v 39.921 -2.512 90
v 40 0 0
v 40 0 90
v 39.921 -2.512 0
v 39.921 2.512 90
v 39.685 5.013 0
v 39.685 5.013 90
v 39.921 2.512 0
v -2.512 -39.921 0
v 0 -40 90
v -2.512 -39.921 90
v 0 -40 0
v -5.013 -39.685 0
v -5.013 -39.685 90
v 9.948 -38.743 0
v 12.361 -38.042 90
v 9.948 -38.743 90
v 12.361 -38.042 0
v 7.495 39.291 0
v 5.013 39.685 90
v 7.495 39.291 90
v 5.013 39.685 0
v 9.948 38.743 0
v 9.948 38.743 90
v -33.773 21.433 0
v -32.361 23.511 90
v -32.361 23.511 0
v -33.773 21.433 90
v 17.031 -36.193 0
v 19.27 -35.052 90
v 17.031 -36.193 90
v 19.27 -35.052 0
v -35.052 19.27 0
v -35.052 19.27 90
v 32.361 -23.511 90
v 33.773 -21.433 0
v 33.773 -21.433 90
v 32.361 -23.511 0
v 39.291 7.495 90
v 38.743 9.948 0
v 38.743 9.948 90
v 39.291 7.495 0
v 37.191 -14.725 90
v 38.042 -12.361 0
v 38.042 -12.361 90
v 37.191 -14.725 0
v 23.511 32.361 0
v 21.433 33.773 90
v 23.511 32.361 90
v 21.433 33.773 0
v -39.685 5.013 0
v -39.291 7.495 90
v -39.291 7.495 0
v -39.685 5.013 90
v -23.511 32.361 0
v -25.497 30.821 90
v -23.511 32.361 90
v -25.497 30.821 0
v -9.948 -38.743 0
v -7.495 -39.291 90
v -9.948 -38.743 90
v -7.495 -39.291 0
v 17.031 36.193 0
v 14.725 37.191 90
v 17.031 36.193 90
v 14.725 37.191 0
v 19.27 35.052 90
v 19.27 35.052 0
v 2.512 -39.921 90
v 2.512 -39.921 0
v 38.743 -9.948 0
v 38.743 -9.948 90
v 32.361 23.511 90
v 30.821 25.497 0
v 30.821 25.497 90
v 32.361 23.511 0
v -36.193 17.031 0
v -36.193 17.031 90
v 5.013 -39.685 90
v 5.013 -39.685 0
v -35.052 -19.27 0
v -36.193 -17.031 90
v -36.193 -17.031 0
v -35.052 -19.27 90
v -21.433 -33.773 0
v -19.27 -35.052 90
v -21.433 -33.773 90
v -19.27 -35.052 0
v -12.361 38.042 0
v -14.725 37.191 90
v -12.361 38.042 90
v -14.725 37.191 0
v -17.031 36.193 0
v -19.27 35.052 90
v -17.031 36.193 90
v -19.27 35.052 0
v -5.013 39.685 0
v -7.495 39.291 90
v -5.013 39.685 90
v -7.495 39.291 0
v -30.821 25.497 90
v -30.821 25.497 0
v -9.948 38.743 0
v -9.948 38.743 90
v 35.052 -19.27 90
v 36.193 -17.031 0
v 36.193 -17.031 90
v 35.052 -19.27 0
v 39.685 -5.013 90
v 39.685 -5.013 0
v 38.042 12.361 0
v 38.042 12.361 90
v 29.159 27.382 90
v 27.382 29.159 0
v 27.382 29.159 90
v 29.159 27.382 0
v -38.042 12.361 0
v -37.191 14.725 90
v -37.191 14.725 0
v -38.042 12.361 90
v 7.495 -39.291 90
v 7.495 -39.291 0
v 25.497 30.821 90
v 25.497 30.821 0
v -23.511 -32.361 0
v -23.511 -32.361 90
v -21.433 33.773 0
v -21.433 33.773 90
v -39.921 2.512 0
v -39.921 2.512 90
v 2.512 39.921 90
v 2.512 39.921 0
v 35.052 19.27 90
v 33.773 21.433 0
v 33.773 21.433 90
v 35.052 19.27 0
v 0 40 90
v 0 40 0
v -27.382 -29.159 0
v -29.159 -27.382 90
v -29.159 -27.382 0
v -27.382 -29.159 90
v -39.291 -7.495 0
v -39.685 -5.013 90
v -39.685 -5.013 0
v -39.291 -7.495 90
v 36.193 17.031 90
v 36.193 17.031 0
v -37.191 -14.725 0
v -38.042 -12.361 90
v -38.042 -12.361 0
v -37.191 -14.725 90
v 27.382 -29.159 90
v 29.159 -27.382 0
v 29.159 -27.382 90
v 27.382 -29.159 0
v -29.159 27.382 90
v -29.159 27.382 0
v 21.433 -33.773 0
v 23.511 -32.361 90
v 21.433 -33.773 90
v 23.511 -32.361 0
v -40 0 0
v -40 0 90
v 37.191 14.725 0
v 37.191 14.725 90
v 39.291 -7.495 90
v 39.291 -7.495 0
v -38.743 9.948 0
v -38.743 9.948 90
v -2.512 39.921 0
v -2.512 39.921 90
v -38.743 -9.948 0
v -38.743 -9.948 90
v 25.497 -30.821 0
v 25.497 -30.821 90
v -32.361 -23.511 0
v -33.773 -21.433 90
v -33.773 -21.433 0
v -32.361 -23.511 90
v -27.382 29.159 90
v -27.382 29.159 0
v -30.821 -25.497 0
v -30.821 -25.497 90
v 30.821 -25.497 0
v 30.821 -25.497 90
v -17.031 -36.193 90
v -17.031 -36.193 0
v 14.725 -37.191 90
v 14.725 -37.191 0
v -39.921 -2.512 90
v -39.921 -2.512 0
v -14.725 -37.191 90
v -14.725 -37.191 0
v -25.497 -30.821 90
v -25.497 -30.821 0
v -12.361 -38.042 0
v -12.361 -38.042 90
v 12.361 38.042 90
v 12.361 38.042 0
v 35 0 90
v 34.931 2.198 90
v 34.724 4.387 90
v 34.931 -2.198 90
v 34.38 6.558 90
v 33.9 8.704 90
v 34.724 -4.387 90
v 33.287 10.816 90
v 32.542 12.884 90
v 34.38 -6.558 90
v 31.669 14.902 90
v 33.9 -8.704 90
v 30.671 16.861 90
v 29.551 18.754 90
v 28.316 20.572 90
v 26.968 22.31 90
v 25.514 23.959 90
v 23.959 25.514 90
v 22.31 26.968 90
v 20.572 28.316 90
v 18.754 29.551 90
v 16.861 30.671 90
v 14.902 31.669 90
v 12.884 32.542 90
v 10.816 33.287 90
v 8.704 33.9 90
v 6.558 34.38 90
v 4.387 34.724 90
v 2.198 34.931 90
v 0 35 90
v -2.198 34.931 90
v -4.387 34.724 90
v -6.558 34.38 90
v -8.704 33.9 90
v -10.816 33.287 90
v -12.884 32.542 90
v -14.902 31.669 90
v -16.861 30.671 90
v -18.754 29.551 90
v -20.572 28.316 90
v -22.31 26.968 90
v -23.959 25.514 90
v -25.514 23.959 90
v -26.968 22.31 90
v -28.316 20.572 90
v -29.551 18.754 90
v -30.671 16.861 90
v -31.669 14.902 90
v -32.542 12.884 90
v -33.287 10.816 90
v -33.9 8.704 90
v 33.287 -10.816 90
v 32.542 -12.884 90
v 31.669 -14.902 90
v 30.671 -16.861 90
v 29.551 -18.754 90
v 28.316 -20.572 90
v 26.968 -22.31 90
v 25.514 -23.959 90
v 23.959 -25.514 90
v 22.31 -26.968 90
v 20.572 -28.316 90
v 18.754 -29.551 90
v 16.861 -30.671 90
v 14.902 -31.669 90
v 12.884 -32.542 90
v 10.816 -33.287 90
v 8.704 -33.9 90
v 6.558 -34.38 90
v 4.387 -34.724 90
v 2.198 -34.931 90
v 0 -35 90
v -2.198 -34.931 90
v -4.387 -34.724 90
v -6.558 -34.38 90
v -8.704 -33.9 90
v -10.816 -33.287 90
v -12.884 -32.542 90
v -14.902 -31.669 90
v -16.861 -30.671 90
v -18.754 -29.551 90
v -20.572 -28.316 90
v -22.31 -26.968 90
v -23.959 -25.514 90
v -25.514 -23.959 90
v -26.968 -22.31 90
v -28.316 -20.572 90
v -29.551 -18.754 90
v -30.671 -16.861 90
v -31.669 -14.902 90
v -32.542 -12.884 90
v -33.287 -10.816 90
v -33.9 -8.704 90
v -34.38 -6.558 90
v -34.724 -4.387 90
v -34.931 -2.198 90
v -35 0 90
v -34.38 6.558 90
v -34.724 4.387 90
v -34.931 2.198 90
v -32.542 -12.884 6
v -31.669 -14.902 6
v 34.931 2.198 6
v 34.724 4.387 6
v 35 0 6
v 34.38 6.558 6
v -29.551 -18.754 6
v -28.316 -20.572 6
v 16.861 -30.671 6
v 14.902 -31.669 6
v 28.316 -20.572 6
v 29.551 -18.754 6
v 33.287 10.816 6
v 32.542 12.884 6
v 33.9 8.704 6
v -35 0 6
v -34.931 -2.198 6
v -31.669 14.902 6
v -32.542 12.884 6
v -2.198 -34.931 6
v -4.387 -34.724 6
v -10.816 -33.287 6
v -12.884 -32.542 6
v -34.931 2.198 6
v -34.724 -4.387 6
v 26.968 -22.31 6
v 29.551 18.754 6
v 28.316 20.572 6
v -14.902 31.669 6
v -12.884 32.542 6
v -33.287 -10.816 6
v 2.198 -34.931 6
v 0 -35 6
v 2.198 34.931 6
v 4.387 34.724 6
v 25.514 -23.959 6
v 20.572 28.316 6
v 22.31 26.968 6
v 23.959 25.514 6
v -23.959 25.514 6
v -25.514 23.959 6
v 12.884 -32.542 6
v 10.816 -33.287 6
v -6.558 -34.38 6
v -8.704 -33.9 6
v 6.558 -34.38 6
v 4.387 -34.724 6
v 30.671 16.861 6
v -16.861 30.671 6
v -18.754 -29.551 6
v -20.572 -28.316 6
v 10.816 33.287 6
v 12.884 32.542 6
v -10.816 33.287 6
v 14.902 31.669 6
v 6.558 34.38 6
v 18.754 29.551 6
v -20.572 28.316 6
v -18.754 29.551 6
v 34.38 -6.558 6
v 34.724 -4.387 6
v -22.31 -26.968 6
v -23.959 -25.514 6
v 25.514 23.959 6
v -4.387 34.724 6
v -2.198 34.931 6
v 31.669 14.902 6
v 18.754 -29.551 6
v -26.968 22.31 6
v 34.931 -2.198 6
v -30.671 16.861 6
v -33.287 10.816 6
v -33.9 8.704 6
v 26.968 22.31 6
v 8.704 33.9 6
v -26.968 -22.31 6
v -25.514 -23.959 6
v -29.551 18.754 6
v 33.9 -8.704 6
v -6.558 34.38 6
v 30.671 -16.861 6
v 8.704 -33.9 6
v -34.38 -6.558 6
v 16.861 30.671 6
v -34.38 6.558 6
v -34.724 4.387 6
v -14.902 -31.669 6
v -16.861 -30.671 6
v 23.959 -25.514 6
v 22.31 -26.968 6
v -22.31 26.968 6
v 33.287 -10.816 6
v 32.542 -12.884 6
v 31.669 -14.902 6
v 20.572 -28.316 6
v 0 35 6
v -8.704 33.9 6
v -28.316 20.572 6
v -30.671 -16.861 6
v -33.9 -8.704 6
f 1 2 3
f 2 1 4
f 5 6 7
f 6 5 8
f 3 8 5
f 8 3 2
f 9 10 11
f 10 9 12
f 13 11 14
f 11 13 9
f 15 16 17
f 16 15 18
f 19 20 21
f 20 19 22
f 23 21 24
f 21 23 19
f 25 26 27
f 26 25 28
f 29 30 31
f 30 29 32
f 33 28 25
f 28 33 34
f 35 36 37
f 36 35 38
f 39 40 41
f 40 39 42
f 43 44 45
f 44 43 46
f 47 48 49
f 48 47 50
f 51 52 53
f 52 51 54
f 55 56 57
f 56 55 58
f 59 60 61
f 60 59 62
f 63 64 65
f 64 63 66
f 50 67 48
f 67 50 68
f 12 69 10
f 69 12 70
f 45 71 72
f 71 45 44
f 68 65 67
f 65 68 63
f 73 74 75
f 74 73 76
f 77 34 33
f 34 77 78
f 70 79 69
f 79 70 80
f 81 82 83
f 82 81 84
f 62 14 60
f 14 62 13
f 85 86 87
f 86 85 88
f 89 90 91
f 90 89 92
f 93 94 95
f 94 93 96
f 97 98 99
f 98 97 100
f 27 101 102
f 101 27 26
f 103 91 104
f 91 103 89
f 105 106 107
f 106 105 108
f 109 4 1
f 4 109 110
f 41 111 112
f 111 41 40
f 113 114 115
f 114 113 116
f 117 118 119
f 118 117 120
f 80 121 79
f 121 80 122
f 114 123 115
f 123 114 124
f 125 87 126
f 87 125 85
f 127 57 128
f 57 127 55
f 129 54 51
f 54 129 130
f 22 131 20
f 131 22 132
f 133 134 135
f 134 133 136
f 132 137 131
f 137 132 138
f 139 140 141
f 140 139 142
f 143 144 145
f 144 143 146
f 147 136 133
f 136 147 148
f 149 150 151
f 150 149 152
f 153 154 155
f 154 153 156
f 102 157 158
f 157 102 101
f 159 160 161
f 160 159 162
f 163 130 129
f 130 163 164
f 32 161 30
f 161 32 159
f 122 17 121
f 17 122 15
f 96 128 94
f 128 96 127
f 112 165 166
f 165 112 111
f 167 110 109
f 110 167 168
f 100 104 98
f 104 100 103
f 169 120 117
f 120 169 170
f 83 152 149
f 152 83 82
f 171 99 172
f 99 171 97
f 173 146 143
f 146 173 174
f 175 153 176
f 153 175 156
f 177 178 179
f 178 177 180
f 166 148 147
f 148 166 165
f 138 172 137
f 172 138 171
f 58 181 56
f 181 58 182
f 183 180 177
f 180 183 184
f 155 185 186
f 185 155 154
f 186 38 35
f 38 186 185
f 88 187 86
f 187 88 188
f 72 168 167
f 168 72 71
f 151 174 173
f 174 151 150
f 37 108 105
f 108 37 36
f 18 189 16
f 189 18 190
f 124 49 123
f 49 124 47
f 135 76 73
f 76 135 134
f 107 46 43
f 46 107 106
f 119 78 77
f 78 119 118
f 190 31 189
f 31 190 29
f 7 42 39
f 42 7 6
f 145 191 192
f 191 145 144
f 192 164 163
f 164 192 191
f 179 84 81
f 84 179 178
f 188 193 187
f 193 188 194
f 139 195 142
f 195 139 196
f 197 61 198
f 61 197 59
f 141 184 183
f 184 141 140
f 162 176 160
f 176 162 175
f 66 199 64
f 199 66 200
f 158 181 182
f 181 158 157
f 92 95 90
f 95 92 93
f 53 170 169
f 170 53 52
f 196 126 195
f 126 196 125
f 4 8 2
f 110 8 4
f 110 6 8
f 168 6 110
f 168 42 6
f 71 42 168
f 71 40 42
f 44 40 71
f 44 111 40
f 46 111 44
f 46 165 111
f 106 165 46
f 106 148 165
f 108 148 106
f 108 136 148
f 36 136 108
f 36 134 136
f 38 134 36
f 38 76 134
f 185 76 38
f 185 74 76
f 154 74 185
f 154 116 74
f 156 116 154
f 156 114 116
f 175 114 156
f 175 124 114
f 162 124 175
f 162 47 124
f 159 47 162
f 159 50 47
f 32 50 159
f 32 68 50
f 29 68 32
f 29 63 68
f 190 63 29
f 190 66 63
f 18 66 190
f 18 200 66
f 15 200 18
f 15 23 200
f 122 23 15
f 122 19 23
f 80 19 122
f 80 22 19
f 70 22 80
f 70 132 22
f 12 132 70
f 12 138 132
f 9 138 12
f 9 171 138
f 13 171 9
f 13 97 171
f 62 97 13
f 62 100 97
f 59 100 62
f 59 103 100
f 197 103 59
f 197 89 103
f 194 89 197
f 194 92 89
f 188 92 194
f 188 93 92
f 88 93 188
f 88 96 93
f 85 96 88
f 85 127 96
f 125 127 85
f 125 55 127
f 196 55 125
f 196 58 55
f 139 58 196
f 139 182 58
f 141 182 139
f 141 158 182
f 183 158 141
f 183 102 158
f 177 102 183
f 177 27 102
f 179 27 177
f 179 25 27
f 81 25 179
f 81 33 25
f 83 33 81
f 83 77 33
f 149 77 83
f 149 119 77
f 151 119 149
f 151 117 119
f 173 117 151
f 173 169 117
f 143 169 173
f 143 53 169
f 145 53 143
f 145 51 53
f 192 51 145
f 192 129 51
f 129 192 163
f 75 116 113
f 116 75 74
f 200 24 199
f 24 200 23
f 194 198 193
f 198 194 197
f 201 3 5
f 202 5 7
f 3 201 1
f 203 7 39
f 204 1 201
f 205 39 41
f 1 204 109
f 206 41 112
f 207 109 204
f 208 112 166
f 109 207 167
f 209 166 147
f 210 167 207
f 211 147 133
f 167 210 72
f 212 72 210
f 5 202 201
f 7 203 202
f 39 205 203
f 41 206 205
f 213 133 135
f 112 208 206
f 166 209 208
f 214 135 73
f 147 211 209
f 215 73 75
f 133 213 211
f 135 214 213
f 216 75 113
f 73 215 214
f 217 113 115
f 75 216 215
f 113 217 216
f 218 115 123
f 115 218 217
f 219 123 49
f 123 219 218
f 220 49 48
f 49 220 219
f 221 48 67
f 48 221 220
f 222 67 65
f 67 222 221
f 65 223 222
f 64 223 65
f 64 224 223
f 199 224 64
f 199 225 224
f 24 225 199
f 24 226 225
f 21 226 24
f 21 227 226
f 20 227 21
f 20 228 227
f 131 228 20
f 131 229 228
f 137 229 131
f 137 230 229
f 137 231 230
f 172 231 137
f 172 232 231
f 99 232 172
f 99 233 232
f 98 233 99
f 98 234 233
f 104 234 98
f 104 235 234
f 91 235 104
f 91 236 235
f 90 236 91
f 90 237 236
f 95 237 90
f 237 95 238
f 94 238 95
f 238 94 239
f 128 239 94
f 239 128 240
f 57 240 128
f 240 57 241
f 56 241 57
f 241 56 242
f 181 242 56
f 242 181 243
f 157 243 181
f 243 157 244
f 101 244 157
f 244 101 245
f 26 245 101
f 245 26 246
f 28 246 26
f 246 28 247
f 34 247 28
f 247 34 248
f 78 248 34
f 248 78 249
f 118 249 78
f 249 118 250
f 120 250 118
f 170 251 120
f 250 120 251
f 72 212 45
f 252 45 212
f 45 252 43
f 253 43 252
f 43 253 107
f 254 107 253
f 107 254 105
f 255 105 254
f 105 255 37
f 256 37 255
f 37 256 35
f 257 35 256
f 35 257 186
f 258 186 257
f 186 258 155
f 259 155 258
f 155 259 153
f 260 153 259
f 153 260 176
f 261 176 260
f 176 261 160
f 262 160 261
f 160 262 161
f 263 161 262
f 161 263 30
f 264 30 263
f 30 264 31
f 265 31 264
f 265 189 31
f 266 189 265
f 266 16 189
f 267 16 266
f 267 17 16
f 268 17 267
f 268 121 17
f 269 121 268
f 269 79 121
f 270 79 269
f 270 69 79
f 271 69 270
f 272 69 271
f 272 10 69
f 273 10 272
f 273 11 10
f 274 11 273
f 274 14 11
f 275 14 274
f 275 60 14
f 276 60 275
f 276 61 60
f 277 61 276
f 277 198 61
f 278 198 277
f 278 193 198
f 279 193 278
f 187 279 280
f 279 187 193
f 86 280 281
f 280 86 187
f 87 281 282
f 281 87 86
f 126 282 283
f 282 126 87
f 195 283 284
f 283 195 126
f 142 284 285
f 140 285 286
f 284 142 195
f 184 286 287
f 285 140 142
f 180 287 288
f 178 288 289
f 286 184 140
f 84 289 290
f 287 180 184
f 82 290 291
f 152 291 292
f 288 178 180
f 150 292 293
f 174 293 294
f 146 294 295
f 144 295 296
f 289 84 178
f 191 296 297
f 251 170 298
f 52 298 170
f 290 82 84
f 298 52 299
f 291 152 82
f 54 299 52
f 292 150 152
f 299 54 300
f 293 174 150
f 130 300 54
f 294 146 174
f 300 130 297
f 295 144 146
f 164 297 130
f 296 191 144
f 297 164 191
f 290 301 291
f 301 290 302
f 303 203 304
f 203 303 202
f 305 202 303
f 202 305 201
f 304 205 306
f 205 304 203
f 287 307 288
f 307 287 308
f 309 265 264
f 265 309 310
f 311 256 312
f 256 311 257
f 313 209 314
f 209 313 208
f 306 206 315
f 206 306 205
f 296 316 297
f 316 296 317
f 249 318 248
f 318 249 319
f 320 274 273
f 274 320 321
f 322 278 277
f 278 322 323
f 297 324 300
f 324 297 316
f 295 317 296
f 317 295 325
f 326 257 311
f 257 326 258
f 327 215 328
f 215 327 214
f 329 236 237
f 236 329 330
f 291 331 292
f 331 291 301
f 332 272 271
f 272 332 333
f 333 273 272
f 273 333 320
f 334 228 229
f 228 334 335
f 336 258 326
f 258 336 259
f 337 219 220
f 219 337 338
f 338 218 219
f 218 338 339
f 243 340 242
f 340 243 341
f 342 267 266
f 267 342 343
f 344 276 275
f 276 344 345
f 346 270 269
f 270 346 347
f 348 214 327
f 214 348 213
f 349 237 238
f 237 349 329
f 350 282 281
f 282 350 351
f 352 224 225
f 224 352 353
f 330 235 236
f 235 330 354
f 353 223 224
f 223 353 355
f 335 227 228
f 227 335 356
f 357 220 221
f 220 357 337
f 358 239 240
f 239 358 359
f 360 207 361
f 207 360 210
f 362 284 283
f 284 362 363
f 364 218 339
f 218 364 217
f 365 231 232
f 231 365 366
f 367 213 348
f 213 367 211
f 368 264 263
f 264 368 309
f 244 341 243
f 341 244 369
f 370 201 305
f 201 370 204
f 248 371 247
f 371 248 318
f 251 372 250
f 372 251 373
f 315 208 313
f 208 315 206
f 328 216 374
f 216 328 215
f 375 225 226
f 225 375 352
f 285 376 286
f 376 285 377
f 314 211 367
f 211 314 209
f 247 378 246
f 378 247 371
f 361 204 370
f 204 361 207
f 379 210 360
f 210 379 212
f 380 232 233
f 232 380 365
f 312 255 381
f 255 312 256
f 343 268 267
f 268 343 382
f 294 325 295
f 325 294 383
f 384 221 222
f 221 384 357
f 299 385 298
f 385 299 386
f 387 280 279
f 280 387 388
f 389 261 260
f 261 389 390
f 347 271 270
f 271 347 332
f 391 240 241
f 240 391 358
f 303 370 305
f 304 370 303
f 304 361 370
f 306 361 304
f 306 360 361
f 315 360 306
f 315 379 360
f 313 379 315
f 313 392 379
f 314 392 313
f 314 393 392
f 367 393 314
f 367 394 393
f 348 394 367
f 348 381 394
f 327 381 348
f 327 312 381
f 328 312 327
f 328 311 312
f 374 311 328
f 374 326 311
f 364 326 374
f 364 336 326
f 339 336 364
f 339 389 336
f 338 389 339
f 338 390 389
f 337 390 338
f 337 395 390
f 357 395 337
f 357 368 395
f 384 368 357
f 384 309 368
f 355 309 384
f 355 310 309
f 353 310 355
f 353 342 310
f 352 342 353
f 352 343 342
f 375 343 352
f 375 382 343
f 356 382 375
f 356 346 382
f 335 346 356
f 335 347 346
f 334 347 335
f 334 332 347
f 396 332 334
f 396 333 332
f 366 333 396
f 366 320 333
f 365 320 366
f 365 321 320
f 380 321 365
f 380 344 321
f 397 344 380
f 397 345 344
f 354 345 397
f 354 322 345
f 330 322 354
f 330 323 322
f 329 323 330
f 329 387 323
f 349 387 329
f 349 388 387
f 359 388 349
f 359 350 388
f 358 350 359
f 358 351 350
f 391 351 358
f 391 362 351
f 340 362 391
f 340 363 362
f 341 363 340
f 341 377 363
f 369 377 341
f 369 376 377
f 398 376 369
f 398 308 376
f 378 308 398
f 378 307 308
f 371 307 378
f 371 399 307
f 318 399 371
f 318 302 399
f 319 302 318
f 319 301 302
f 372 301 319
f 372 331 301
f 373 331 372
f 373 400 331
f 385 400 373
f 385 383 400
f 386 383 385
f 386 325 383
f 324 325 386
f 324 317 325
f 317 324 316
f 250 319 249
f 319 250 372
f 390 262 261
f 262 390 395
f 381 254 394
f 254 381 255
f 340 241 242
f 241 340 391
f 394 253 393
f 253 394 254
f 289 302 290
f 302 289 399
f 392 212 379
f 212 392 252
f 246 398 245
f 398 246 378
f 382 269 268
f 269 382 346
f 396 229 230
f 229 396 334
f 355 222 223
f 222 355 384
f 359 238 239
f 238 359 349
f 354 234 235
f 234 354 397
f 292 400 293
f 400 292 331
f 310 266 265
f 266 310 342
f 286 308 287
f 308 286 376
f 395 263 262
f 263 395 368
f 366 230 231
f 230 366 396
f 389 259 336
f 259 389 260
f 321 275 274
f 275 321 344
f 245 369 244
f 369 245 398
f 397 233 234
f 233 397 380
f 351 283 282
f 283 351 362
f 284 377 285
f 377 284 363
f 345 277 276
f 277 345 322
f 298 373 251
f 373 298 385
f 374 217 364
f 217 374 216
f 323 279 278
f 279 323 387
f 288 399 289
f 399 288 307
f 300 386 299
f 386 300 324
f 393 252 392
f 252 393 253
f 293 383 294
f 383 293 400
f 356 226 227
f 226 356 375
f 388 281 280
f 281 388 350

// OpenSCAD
// マグカップ

$fn = 100;

// 本体パラメータ
outer_d = 80;
inner_d = 70;
height = 90;
bottom_thickness = 6;

// 取手パラメータ
handle_inner_h = 30;   // 取手内側の高さ(Z方向)
handle_inner_w = 25;   // 取手内側の幅(本体からの突き出し方向 = X)
handle_thickness = 8;  // 取手の太さ(径方向の太さ)
handle_depth = 12;     // 取手の Y 方向の厚み(指がかかる面の幅)

module mug_body() {
    difference() {
        cylinder(d = outer_d, h = height);
        translate([0, 0, bottom_thickness])
            cylinder(d = inner_d, h = height - bottom_thickness + 0.01);
    }
}

module handle() {
    // XZ 平面で D 字の外形と内側の穴を作り、Y 方向に linear_extrude で厚み(handle_depth)を付ける
    
    handle_outer_h = handle_inner_h + 2 * handle_thickness; // Z 方向の総高さ
    handle_outer_w = handle_inner_w + handle_thickness;     // X 方向の総幅(本体面から外へ)
    
    z_center = height / 2;
    // 本体外周に少し食い込ませて確実に union
    x_base = outer_d/2 - 1;
    
    translate([x_base, 0, z_center])
        rotate([90, 0, 0])  // XY平面で描いた2DをZ方向に立てる(Y軸→Z軸)
            translate([0, 0, -handle_depth/2])
                linear_extrude(height = handle_depth)
                    difference() {
                        // 外形 D 字: 左端(本体側)は直線、右側は半円
                        hull() {
                            // 本体側の直線部(Z方向に伸びる細長い長方形)
                            translate([0, 0])
                                square([0.1, handle_outer_h], center = true);
                            // 外側の半円
                            translate([handle_outer_w - handle_outer_h/2, 0])
                                circle(d = handle_outer_h);
                        }
                        // 内側の穴 (D字の内側)
                        hull() {
                            translate([handle_thickness, 0])
                                square([0.1, handle_inner_h], center = true);
                            translate([handle_thickness + handle_inner_w - handle_inner_h/2, 0])
                                circle(d = handle_inner_h);
                        }
                    }
}

union() {
    mug_body();
    handle();
}
